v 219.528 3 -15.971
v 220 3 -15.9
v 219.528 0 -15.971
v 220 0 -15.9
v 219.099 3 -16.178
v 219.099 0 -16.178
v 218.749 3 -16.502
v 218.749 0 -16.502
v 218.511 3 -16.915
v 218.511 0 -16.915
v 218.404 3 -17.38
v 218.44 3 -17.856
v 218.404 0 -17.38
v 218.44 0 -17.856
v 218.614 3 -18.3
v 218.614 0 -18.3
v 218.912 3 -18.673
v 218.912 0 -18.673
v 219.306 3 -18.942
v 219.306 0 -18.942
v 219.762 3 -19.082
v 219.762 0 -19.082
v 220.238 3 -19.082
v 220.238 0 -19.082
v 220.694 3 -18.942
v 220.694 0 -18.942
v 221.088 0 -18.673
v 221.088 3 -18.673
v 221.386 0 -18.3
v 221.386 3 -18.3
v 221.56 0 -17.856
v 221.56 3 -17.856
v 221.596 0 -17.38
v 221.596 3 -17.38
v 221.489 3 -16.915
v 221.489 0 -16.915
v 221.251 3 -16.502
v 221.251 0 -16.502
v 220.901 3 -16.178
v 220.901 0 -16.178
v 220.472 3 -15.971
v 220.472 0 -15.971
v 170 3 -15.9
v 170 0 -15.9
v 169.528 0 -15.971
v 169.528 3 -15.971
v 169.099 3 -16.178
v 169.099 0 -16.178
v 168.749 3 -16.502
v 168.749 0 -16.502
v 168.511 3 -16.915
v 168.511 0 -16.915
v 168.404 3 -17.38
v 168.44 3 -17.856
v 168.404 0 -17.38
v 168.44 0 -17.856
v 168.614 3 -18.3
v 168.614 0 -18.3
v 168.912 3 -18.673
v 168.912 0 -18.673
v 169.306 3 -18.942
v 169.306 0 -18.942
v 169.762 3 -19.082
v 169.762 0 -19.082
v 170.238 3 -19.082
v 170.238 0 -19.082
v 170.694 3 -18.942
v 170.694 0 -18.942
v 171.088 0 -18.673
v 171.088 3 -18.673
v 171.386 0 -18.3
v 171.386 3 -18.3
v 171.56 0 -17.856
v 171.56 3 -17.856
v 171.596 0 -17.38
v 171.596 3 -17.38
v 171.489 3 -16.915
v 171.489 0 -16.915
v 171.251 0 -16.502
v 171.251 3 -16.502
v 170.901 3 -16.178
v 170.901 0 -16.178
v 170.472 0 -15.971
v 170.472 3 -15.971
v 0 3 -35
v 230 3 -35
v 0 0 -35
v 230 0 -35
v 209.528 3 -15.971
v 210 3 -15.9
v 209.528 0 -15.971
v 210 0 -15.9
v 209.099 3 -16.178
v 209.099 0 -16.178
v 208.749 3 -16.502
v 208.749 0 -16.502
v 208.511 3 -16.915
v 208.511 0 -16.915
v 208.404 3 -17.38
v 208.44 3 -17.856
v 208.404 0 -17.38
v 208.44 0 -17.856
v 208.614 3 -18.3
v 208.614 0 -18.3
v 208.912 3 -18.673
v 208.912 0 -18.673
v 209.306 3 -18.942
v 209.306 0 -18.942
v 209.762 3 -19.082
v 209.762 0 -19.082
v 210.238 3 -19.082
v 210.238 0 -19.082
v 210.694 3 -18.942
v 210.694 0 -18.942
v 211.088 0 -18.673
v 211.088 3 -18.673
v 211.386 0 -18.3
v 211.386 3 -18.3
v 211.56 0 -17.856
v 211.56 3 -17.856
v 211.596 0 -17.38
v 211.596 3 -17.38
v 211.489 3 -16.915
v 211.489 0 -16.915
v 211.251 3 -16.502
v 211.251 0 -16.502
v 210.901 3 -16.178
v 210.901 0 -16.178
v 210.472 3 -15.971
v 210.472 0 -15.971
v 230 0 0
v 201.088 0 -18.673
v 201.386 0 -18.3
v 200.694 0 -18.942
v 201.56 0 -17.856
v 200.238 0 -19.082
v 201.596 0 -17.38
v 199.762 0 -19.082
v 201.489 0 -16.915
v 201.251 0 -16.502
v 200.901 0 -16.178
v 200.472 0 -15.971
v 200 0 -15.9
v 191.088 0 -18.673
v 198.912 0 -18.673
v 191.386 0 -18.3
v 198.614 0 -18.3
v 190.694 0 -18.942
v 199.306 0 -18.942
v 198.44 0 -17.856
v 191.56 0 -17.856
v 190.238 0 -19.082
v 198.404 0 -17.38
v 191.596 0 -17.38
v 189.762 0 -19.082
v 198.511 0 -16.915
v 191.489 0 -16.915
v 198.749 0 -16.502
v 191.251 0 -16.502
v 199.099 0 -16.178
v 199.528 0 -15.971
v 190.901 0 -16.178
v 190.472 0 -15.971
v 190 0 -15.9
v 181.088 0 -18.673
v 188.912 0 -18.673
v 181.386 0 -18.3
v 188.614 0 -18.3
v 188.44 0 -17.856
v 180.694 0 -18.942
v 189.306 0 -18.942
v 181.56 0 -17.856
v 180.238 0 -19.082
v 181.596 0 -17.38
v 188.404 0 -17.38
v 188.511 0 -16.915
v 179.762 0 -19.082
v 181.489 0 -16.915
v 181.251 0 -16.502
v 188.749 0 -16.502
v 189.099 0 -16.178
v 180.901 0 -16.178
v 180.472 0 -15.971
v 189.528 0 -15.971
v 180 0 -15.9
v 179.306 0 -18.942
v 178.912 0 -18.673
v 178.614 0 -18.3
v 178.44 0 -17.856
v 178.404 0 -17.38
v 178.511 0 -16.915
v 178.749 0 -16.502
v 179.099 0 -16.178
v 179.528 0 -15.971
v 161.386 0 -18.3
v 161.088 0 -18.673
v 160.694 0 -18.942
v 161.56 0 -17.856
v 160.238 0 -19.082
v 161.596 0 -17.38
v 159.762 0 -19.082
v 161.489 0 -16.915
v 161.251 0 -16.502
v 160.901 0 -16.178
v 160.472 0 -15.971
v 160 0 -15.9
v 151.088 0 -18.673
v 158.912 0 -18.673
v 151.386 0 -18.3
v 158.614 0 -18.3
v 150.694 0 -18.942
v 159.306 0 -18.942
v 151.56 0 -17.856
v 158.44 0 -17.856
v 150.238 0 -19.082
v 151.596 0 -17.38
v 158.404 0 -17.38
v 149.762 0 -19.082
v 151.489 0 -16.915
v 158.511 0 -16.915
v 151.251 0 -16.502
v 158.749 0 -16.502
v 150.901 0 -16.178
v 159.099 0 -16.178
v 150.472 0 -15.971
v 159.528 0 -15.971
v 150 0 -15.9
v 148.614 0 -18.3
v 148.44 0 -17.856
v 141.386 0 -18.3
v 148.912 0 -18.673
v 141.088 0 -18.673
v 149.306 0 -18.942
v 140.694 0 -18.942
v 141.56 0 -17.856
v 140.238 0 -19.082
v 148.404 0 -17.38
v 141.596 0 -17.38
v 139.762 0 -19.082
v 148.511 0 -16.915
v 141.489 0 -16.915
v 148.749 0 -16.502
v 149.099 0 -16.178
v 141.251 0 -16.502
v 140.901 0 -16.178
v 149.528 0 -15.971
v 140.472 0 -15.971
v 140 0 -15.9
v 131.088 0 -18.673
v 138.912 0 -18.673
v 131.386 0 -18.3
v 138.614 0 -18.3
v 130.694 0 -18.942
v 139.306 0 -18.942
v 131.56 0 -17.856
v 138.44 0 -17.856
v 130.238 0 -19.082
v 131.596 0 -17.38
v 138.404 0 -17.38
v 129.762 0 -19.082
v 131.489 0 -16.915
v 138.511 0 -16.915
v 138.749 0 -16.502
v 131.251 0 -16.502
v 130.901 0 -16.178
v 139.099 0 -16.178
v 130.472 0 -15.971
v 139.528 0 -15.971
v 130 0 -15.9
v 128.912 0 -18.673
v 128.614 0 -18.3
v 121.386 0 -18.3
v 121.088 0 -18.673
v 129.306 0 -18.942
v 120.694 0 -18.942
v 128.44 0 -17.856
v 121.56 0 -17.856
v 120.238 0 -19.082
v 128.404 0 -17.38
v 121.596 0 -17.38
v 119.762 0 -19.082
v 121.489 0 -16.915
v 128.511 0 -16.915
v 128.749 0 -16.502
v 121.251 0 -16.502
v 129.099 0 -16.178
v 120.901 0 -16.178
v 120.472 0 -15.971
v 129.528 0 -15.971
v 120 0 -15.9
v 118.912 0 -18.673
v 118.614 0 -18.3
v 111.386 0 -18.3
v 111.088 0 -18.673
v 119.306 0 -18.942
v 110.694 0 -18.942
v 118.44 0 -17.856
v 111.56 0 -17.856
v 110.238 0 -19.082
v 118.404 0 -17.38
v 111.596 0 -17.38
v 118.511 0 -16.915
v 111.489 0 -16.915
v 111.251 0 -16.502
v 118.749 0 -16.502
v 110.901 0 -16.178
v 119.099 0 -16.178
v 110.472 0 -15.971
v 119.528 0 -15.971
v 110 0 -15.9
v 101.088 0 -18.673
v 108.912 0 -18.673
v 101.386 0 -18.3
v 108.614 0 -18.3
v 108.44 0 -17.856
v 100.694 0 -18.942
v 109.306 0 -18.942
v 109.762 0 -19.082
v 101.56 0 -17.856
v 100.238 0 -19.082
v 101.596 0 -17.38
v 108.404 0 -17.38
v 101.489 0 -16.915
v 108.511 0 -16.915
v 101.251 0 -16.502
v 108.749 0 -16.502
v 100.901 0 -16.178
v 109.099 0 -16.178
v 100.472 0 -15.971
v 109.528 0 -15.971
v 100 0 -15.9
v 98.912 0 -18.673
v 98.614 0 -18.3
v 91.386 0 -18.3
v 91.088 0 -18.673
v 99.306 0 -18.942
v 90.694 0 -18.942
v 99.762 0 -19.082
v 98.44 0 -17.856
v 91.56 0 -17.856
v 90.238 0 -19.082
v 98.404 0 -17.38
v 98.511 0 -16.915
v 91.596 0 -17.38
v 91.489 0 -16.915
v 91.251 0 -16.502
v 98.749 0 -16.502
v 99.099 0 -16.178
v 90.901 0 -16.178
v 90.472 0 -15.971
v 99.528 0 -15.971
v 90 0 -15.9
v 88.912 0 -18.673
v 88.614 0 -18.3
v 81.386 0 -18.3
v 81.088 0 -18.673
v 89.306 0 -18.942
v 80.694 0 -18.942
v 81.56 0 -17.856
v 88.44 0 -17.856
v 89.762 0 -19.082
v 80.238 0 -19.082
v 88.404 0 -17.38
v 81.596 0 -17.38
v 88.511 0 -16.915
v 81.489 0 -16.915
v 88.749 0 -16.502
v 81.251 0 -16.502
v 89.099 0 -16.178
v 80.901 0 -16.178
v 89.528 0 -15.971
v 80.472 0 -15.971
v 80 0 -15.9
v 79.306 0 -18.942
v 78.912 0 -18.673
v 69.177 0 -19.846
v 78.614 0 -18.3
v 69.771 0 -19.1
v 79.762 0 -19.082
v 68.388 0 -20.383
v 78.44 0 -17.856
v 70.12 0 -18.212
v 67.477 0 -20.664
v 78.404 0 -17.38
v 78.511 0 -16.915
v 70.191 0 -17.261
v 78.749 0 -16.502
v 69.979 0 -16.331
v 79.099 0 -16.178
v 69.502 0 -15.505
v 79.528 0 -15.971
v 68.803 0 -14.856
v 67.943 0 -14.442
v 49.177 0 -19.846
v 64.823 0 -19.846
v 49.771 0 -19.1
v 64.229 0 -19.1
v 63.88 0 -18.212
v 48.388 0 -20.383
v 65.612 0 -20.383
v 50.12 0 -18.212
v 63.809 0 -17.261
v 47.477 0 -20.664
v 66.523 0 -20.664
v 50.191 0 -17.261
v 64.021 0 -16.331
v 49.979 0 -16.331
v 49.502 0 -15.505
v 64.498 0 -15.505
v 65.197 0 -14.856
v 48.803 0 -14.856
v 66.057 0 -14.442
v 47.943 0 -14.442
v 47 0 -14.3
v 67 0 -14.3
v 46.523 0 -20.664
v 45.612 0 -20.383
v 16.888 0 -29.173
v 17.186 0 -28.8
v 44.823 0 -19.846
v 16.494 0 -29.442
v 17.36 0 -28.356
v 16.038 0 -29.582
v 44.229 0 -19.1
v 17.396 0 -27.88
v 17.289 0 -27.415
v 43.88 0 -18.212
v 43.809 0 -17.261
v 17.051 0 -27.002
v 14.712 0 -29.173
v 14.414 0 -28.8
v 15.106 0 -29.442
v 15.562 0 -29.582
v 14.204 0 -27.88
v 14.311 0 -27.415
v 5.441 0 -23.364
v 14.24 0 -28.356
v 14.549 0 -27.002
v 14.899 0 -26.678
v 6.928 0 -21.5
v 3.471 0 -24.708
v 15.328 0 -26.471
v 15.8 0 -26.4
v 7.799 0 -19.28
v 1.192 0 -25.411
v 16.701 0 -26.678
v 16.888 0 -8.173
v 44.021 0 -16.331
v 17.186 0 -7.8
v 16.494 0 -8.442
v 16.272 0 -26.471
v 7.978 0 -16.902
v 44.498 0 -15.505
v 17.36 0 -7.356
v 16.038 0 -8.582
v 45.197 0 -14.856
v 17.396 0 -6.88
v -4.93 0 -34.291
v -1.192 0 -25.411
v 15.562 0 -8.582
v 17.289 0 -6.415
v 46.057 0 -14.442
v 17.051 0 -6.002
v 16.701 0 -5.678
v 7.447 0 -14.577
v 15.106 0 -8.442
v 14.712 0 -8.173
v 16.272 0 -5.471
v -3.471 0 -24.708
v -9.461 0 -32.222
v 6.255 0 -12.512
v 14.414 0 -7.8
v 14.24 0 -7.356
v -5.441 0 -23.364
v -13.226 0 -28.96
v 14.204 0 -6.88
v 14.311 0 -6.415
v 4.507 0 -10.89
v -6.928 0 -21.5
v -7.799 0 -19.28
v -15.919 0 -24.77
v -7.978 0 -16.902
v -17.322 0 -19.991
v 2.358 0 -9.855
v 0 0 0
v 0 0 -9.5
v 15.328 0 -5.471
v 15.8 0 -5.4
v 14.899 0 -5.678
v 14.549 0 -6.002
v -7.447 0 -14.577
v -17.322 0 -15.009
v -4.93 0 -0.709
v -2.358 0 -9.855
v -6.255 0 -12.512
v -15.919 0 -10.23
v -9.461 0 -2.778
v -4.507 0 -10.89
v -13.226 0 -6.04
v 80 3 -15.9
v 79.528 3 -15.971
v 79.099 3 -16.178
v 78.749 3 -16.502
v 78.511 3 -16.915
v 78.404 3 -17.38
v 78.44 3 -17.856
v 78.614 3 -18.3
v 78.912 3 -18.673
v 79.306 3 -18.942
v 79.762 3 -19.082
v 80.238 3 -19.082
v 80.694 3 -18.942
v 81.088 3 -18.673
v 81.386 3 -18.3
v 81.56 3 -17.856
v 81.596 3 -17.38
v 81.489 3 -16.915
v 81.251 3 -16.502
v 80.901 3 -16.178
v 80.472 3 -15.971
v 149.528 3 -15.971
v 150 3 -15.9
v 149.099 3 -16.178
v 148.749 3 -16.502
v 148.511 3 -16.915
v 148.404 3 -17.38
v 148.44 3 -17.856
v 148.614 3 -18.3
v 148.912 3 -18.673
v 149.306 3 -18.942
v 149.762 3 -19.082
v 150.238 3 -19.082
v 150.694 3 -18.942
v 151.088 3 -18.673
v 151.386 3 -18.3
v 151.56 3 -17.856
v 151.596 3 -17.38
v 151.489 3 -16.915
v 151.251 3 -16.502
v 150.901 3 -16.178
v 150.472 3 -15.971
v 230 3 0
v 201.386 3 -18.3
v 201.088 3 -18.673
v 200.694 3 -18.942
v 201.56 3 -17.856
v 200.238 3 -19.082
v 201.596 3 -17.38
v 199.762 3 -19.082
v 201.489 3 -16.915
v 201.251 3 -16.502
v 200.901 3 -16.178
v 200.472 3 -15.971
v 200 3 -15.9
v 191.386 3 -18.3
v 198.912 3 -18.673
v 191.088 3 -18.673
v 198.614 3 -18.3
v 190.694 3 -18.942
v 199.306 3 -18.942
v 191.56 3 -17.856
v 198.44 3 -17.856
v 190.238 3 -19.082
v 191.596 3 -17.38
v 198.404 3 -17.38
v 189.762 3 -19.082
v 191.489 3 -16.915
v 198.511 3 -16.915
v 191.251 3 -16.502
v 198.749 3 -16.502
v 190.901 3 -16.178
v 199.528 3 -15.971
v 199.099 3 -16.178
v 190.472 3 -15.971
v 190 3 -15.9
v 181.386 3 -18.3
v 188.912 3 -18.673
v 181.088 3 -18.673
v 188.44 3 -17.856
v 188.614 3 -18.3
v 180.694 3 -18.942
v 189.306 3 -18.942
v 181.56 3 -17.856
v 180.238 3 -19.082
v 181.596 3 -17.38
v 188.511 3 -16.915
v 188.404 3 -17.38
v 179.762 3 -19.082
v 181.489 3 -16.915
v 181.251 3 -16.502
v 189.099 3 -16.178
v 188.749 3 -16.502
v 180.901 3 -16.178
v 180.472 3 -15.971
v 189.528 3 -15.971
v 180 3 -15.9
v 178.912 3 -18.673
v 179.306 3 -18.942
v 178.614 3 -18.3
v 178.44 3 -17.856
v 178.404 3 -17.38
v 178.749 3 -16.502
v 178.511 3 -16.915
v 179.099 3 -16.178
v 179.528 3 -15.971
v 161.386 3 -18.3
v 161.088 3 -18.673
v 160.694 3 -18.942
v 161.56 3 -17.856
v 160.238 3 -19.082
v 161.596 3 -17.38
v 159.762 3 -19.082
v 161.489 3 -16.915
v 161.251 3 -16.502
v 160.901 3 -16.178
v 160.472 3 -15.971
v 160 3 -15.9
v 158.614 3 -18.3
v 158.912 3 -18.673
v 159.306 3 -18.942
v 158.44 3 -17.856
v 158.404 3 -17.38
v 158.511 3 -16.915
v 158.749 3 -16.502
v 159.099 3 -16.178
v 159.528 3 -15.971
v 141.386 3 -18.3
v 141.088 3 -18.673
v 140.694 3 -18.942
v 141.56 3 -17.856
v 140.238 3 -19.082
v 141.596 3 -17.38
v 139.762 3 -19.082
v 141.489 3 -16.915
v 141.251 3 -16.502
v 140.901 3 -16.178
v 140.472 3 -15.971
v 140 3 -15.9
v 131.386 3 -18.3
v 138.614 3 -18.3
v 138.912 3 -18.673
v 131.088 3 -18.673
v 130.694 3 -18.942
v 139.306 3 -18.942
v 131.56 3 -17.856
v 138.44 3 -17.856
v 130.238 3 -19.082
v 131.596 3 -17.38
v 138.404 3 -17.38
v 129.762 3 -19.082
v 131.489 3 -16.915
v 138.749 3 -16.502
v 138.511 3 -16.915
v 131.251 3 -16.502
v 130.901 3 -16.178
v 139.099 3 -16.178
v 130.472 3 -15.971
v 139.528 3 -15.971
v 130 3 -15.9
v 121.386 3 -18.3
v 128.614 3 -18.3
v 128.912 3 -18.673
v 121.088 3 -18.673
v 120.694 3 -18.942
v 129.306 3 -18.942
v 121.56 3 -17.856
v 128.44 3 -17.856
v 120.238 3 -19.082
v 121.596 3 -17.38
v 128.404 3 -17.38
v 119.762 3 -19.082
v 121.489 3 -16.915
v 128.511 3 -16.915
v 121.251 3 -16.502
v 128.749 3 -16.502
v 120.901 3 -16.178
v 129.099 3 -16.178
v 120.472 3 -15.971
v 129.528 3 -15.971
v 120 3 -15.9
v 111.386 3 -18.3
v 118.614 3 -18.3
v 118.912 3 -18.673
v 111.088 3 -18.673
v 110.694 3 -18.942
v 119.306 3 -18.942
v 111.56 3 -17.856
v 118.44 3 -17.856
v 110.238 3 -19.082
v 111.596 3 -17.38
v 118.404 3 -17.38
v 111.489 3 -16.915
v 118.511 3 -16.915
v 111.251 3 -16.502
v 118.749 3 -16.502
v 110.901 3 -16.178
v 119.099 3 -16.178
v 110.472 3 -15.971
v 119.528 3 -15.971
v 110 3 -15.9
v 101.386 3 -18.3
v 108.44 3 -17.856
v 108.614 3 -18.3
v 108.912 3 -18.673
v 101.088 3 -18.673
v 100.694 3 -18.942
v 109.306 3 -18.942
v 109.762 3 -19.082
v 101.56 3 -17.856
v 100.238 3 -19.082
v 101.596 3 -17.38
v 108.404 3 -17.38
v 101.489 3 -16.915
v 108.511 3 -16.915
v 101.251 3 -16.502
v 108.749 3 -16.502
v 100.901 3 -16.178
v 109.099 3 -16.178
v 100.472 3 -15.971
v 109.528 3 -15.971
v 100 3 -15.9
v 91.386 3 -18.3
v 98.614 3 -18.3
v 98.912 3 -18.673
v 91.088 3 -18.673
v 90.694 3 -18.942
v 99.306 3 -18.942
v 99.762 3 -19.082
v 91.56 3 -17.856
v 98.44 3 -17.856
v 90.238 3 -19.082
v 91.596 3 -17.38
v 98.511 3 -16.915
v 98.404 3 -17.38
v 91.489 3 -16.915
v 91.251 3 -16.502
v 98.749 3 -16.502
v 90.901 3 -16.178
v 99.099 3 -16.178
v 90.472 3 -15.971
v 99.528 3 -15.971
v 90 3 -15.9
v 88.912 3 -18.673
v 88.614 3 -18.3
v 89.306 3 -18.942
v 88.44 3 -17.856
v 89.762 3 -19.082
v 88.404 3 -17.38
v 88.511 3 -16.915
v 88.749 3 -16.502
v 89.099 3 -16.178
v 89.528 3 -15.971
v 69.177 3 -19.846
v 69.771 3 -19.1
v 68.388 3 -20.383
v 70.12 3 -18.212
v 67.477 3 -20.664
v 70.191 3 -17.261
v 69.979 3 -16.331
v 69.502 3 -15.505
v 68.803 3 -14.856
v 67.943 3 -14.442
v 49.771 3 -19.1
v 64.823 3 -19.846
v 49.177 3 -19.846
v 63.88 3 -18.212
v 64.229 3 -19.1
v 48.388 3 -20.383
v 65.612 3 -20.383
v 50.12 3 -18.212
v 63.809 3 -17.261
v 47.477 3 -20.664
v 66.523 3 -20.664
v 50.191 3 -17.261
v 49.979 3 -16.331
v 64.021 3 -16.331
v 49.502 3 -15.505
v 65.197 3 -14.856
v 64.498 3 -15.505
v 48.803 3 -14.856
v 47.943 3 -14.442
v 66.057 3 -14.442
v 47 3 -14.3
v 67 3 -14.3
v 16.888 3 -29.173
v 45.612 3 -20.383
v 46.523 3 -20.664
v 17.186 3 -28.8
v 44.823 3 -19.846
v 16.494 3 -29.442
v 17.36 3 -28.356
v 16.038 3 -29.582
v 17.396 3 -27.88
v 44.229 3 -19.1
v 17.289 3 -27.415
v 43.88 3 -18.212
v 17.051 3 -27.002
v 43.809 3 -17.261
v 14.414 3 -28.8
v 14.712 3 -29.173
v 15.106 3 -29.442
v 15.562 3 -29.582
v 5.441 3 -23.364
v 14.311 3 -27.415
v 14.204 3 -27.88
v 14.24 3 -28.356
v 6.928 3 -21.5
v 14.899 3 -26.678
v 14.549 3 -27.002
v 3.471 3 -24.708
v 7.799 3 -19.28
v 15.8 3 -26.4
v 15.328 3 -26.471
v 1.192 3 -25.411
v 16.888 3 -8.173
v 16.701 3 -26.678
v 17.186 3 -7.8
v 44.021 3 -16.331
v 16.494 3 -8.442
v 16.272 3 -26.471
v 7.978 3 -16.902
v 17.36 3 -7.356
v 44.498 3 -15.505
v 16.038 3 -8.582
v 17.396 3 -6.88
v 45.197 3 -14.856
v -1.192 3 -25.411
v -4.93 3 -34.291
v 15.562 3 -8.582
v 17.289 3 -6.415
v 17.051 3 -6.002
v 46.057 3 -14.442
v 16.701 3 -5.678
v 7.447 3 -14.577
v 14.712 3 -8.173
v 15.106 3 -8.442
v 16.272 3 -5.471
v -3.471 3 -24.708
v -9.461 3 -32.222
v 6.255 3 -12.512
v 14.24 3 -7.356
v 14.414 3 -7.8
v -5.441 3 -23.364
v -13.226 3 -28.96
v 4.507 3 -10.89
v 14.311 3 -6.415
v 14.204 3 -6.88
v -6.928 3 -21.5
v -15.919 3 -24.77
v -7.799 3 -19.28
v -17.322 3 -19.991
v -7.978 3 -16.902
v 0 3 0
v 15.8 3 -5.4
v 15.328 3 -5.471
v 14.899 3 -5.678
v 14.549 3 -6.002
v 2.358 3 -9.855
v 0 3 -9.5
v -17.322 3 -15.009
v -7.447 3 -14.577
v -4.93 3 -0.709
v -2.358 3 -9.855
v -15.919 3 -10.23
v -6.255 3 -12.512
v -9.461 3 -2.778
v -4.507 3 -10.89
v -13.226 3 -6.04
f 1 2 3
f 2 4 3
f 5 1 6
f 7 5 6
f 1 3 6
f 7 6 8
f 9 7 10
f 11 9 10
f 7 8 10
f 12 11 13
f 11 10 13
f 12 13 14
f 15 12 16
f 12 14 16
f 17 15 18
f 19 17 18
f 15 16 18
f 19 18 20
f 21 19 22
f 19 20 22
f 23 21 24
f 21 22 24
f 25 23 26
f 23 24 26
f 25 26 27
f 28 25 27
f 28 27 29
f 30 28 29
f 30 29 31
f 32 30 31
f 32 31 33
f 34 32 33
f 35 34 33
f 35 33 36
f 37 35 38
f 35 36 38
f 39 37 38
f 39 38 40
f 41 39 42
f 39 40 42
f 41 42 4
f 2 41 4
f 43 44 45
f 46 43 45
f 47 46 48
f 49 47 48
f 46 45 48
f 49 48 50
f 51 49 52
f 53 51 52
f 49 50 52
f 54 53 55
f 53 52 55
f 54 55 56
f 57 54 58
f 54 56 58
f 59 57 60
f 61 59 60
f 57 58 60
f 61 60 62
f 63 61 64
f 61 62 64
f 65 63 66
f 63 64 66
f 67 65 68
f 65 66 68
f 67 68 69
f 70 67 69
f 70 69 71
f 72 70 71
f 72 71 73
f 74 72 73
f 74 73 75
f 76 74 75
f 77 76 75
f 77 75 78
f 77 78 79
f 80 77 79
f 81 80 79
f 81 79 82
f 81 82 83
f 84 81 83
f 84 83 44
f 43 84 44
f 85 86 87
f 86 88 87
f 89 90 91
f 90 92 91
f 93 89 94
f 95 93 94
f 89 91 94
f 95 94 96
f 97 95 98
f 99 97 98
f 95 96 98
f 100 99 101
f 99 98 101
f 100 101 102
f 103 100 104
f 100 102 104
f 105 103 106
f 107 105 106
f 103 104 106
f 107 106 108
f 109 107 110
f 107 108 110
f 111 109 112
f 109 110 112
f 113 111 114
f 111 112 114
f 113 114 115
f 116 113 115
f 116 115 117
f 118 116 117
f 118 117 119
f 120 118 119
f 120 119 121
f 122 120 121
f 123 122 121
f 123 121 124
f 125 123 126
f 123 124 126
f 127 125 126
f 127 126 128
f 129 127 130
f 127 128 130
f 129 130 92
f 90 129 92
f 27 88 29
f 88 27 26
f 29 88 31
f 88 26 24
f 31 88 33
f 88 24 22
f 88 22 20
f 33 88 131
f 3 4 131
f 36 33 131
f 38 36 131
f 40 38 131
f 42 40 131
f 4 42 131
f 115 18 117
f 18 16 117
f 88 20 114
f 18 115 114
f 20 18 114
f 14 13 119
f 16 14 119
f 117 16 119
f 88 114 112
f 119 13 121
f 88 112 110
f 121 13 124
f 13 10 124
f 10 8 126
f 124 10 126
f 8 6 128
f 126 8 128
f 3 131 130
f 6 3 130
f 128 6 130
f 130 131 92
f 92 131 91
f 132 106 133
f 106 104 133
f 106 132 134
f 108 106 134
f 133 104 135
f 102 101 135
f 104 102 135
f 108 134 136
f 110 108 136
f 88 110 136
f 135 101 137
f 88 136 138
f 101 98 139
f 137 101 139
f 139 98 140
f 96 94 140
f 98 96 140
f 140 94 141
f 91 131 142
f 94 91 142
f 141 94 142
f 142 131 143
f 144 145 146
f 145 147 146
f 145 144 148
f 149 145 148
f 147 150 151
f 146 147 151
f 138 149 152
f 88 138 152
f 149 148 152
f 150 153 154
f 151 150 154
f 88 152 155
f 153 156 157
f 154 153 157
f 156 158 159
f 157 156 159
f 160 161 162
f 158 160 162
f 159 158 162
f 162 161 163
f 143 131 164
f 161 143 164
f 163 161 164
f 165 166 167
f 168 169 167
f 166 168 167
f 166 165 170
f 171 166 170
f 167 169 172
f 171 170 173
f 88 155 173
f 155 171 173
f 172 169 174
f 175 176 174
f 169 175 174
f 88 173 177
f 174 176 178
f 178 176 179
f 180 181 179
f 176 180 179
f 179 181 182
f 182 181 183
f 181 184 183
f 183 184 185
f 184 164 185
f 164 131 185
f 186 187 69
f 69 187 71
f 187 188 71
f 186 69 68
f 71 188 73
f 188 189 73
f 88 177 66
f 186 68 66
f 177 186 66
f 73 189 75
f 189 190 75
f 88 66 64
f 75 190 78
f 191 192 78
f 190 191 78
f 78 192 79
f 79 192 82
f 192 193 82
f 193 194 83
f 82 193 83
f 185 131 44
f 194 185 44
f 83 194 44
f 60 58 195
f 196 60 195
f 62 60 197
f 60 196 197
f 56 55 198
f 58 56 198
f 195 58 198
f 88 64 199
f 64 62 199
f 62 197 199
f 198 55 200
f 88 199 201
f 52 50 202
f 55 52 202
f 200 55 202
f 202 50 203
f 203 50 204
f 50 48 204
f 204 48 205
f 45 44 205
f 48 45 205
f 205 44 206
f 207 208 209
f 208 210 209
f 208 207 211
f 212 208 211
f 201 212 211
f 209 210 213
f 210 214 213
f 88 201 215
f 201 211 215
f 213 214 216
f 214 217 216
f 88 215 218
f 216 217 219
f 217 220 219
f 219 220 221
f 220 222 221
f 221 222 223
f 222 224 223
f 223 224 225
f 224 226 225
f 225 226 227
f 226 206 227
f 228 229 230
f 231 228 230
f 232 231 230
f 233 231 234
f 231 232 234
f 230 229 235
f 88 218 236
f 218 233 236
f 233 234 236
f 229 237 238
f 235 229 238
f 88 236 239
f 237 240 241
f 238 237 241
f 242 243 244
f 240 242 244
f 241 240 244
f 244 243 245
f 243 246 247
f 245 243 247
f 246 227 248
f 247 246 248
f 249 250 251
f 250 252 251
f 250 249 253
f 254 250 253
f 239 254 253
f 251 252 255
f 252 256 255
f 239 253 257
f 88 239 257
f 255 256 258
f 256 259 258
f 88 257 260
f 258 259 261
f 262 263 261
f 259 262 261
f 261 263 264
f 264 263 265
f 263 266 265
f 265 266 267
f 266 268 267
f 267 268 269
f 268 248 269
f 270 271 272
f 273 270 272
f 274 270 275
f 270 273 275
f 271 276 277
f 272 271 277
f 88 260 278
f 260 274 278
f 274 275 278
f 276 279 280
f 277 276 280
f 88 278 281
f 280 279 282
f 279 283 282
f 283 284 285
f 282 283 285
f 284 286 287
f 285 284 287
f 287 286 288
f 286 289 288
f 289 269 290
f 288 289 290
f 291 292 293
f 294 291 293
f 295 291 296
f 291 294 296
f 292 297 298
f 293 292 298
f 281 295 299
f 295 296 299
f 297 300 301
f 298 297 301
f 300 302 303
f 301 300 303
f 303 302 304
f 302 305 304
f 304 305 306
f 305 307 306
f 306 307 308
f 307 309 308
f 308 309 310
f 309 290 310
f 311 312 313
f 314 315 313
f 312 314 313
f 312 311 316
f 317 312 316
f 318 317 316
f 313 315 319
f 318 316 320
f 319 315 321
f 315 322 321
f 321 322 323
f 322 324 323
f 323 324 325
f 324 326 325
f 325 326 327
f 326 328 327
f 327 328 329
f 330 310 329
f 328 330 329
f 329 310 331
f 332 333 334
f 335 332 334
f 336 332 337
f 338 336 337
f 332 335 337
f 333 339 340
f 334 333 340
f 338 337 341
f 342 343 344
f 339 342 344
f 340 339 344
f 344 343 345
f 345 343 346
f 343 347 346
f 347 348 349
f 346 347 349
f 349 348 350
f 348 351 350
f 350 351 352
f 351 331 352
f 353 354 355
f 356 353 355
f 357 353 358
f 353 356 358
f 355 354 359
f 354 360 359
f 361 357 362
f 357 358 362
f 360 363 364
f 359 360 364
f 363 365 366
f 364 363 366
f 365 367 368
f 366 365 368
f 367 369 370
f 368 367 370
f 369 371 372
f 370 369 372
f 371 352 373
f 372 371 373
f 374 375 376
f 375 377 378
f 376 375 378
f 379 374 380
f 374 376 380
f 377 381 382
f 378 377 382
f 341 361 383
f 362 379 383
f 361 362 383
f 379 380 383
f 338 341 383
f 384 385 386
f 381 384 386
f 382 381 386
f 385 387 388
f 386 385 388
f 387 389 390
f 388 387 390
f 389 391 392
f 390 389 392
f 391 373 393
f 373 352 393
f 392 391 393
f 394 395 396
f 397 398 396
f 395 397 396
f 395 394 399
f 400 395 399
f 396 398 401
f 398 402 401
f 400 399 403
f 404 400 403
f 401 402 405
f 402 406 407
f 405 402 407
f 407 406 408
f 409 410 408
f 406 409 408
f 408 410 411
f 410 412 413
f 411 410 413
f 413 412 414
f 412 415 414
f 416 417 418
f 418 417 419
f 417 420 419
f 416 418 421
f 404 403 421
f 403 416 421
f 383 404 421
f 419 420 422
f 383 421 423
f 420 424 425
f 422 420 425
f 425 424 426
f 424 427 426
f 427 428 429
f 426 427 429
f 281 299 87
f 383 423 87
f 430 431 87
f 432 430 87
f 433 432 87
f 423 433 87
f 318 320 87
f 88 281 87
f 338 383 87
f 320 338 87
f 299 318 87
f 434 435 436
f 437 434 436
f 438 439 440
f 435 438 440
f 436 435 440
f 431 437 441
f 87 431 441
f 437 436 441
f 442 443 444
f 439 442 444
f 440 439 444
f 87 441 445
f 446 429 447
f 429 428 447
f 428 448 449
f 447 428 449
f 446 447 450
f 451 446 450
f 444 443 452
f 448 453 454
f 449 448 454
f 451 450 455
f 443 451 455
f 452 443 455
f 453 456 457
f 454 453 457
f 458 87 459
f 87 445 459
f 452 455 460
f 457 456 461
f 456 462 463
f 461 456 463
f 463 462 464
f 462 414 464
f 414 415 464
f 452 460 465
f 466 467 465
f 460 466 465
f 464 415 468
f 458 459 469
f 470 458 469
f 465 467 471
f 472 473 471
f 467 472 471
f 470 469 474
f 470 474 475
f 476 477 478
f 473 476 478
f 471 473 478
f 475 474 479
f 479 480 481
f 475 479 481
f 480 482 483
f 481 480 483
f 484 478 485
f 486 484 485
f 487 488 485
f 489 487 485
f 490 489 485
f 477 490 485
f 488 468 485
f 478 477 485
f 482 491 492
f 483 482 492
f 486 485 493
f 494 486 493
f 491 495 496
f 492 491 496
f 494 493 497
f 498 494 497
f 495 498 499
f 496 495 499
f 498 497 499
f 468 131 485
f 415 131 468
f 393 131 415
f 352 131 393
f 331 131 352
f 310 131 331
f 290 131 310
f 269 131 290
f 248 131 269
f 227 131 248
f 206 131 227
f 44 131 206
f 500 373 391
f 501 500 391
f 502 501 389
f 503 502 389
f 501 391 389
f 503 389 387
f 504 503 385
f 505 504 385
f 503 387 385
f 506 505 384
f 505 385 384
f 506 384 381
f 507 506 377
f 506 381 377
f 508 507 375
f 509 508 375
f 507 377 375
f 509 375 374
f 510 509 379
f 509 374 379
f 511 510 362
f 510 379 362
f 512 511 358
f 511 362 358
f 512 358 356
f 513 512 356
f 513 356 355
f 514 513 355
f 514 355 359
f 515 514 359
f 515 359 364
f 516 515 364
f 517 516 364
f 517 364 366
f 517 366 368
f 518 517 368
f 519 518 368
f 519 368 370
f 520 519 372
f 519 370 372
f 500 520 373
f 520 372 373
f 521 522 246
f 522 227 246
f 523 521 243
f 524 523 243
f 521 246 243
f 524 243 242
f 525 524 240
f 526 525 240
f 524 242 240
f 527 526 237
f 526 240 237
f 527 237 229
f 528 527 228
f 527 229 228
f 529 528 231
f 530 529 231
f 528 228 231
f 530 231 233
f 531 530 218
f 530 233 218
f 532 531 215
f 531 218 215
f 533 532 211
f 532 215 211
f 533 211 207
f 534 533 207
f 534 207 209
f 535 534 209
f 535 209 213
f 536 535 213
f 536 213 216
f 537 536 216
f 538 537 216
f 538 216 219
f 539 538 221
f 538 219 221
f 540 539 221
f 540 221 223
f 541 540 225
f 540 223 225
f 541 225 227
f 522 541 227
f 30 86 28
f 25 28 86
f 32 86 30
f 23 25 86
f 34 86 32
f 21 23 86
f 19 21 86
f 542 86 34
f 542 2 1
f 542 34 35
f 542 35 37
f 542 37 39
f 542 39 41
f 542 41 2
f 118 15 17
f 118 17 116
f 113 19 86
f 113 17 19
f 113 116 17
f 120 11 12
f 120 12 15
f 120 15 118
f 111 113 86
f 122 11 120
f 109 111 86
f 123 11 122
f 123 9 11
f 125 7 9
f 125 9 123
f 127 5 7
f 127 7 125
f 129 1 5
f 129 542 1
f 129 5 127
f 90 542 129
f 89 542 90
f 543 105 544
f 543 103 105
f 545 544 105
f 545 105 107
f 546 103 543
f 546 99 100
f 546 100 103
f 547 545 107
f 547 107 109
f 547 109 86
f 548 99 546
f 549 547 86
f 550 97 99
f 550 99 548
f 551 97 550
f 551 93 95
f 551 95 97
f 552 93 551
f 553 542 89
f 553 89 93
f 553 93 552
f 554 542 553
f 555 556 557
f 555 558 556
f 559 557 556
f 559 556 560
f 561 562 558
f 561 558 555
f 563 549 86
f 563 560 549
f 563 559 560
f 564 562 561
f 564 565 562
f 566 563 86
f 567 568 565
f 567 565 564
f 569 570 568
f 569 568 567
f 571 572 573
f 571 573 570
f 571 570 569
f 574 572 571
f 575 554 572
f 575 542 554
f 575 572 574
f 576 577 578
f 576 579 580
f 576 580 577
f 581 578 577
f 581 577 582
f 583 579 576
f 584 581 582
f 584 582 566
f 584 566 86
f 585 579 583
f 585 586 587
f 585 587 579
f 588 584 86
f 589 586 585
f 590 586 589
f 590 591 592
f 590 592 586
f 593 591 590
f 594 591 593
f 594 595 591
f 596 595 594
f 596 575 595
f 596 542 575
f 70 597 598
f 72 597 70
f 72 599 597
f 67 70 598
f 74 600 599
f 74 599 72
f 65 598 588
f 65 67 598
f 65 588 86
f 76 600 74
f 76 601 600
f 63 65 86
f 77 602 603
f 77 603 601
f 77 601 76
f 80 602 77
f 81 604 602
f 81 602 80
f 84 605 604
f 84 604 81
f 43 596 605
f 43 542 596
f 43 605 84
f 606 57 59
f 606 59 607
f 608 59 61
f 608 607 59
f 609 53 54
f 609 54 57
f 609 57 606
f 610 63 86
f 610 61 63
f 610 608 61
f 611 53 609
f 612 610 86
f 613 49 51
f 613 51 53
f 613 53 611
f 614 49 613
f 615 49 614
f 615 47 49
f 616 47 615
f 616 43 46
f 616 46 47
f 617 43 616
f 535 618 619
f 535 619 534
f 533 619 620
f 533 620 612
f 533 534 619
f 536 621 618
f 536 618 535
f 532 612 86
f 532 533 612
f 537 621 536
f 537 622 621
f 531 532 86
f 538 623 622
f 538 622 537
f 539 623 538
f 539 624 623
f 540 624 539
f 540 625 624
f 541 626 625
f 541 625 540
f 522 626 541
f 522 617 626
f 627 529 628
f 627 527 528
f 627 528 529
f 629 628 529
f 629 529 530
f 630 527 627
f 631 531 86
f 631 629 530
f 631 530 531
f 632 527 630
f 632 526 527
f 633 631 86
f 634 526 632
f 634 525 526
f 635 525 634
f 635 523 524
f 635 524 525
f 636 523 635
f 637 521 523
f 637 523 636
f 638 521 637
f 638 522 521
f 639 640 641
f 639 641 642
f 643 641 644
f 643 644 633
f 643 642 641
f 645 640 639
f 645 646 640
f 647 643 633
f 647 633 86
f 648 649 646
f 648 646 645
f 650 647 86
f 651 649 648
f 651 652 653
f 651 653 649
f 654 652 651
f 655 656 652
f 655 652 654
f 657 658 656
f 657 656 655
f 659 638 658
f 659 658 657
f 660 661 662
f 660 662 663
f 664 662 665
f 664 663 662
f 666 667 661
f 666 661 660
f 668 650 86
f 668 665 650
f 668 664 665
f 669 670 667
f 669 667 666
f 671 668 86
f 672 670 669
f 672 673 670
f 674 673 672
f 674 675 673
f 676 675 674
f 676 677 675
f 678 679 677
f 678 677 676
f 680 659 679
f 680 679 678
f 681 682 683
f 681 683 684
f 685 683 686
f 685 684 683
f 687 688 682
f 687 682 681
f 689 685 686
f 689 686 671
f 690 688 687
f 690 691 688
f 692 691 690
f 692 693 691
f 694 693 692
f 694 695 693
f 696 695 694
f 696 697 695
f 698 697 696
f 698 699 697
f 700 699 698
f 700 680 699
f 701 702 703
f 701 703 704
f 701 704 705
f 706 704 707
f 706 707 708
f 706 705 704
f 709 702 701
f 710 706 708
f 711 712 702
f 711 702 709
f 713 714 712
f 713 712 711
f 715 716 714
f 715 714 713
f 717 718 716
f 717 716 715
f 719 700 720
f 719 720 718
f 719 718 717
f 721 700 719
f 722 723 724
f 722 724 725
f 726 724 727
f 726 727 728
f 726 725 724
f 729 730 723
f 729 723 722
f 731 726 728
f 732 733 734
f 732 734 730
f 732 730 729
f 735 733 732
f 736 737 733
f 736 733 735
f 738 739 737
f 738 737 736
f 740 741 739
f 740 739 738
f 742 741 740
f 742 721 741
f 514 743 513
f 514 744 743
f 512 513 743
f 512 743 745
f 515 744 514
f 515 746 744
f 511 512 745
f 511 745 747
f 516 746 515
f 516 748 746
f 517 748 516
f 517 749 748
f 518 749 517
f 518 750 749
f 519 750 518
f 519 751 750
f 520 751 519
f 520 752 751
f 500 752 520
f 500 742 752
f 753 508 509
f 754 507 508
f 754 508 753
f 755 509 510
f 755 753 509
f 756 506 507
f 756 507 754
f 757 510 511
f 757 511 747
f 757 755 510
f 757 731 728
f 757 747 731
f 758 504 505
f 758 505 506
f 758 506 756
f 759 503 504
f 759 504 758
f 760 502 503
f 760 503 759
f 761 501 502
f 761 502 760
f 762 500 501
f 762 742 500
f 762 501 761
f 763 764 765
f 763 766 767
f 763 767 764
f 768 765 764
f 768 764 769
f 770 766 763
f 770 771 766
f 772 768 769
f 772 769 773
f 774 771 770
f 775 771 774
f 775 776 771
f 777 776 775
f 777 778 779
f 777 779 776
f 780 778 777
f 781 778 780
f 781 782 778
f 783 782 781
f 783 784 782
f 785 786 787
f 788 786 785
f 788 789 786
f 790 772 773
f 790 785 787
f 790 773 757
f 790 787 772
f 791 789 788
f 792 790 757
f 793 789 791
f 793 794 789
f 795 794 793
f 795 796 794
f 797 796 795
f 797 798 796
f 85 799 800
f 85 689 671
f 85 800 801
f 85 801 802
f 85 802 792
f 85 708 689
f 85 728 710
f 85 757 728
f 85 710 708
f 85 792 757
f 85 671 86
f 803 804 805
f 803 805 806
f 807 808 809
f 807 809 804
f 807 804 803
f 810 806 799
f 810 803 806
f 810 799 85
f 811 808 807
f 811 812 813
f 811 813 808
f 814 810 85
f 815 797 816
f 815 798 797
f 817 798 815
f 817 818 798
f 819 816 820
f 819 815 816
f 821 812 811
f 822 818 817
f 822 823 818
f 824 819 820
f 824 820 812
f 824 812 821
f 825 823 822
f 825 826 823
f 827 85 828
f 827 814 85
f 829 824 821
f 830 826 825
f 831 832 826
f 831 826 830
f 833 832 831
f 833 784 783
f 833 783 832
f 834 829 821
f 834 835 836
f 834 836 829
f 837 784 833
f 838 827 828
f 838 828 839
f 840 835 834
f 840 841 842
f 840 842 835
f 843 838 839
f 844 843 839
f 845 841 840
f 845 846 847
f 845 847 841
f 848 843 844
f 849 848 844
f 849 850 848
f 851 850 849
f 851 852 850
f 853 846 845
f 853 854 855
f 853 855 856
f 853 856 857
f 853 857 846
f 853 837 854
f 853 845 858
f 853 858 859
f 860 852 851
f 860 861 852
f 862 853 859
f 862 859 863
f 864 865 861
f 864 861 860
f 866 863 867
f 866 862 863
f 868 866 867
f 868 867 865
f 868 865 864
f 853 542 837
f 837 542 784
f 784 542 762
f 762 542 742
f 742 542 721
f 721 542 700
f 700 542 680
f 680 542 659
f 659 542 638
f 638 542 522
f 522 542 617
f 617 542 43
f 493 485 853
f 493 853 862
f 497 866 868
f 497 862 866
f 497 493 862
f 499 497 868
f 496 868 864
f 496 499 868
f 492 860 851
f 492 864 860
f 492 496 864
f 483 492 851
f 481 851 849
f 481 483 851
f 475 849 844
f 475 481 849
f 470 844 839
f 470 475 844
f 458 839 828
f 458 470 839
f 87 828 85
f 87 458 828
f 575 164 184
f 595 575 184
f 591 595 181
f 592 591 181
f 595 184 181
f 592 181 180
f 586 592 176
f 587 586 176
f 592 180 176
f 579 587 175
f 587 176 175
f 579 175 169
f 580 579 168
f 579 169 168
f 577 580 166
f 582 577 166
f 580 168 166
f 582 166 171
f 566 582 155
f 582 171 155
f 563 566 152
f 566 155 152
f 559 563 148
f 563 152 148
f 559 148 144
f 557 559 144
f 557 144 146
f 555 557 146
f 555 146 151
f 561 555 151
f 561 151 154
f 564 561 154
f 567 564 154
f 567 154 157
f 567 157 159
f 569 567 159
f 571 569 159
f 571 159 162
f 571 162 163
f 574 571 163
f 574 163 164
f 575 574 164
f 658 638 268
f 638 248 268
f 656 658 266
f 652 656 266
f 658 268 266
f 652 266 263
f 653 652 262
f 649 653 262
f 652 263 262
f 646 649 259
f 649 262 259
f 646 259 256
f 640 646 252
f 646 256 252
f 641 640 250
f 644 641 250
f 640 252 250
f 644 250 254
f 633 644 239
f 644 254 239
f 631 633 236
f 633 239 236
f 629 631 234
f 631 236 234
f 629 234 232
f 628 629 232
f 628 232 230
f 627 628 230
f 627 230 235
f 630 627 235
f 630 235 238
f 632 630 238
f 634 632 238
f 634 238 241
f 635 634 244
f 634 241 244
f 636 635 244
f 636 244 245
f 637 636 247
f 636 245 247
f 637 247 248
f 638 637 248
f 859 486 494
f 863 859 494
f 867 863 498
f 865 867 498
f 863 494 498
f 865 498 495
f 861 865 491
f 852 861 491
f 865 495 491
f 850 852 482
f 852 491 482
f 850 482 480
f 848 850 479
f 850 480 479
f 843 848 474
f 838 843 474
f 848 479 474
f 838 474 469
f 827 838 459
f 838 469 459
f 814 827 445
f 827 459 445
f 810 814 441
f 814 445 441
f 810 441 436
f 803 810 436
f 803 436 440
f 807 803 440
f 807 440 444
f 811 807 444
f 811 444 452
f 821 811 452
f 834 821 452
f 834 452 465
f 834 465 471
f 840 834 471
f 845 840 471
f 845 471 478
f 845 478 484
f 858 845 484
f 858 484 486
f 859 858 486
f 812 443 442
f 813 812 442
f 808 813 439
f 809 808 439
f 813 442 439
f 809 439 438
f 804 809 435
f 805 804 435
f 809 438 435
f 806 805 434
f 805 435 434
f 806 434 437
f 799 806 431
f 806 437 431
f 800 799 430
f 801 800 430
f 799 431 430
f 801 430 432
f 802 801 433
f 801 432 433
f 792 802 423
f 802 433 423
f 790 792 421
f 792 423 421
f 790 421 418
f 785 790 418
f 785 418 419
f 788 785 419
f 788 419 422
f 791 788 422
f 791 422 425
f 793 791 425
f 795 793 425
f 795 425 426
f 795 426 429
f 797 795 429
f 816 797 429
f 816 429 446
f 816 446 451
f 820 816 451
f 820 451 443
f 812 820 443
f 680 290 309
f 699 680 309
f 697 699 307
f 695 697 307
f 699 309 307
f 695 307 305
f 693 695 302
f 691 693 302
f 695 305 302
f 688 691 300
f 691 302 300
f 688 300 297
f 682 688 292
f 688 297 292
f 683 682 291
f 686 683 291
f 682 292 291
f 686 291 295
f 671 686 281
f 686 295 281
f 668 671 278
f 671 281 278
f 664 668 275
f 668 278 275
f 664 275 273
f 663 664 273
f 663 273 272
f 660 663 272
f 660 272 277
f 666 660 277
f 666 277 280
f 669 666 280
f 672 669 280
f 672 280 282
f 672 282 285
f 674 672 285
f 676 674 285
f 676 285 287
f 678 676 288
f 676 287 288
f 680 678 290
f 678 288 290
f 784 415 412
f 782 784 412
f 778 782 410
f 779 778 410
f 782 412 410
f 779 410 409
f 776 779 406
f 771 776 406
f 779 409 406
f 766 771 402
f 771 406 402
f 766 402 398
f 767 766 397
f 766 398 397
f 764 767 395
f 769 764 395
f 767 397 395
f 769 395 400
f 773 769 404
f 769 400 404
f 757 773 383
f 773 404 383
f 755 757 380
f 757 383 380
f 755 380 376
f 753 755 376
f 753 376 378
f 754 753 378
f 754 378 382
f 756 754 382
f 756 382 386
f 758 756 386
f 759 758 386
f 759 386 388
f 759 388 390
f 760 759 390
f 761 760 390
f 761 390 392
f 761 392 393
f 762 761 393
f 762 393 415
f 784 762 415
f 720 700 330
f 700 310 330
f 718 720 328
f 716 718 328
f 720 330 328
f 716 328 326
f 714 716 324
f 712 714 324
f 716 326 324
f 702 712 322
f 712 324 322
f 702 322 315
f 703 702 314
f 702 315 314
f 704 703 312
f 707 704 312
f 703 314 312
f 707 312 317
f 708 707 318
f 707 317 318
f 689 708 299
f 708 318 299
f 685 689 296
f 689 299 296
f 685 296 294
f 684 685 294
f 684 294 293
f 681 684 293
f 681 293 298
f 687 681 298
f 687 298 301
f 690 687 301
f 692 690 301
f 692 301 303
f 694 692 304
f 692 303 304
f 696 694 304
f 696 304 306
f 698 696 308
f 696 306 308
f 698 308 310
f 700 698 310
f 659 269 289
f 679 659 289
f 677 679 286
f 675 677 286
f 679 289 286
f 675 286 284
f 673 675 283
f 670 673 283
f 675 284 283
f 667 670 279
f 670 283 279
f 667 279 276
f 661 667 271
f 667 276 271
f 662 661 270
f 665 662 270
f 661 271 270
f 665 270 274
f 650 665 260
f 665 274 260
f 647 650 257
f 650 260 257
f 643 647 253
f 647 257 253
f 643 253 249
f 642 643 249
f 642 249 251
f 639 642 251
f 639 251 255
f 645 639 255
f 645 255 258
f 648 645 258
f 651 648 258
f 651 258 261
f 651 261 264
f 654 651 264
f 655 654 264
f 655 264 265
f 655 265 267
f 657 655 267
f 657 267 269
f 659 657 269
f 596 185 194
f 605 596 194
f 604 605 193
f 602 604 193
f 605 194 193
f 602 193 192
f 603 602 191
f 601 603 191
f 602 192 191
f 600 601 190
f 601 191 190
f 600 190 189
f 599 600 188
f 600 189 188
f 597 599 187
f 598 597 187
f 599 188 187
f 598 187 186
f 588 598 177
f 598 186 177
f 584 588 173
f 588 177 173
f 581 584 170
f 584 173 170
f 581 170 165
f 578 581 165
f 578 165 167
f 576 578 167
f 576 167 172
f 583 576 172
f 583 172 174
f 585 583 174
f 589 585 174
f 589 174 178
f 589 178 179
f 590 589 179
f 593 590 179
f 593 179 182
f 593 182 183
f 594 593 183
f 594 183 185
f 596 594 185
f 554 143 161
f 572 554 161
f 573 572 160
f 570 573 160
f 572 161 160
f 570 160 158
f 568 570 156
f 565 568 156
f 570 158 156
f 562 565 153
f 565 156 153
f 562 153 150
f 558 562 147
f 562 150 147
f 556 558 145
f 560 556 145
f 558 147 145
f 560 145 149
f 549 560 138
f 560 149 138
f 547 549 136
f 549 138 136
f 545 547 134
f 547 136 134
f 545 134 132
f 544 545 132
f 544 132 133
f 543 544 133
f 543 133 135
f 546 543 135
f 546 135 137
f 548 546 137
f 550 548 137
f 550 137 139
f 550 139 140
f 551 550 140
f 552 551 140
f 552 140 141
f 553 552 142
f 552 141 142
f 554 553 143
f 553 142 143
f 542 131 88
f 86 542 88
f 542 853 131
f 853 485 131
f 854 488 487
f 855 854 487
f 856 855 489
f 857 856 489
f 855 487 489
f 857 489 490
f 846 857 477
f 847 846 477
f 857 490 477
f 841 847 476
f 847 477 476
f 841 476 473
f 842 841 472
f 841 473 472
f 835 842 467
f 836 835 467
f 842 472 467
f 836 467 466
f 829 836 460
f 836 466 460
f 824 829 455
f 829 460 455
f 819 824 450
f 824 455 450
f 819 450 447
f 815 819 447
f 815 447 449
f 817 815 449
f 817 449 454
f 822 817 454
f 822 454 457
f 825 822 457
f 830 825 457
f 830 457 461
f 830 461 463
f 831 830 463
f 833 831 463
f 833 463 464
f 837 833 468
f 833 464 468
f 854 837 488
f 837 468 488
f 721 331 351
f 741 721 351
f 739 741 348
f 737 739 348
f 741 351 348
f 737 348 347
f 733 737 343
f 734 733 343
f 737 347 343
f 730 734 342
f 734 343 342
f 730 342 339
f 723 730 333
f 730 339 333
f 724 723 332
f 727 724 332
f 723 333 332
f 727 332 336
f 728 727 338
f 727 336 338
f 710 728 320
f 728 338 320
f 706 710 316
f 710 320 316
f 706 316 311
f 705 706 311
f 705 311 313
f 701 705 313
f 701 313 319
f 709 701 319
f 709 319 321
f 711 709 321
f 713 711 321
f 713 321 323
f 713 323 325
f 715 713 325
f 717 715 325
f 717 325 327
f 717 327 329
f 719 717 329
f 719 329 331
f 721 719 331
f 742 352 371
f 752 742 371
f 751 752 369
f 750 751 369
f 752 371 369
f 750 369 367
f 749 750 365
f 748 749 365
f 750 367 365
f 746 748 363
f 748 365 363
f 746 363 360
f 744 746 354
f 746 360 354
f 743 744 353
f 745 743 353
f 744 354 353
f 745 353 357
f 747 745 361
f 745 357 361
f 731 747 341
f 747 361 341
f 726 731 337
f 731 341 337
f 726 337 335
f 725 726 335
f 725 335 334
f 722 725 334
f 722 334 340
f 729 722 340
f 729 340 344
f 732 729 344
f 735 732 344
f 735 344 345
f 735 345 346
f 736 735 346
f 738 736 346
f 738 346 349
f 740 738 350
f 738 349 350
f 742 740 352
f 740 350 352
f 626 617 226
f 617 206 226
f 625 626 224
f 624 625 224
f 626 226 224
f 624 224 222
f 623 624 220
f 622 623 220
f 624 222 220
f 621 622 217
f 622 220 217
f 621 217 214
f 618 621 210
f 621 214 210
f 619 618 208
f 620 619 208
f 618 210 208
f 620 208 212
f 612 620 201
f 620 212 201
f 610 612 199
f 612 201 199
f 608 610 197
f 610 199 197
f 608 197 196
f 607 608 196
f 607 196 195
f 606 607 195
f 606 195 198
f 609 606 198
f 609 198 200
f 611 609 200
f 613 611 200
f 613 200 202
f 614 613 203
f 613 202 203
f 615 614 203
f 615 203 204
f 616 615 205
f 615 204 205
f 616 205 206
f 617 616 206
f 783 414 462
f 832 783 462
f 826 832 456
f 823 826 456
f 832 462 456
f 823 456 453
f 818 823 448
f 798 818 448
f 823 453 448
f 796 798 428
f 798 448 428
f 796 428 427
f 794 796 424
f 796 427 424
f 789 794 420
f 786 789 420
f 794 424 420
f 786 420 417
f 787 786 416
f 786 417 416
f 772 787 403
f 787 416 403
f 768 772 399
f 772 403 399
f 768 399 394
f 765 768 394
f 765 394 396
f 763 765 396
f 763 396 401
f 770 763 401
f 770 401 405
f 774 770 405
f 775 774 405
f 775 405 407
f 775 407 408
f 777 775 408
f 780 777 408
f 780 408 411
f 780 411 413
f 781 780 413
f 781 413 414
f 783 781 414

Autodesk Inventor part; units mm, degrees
ref_plane "YZ Plane" through (0, 0, 0) normal (1, 0, 0) x (0, 1, 0)
ref_plane "XZ Plane" through (0, 0, 0) normal (0, 1, 0) x (-1, 0, 0)
ref_plane "XY Plane" through (0, 0, 0) normal (0, 0, 1) x (1, 0, 0)
sketch "スケッチ1" plane through (0, 0, 0) normal (0, 1, 0) x (-1, 0, 0)
  line L0 (0, 0) -> (-230, 0)
  line L1 (-230, 0) -> (-230, -35)
  line L2 (-230, -35) -> (0, -35)
  line L3 (0, -35) -> (0, 0)
  arc A0 (0, -35) -> (0, 0) centre (0, -17.5) ccw
  dimension "d0" = 230
  dimension "d1" = 35
  dimension "d2" = 17.5
extrude "押し出し1" add sketch "スケッチ1" along normal blind 3
sketch "スケッチ2" plane through (0, 3, 0) normal (0, 1, 0) x (1, 0, 0)
  line L0 (0, 17.5) -> (238.6526, 17.5)
  line L1 (0, 0) -> (230, 0) projected
  arc A0 (0, 35) -> (0, 0) centre (0, 17.5) ccw projected
  point P0 (90, 17.5)
  point P1 (100, 17.5)
  point P2 (110, 17.5)
  point P3 (120, 17.5)
  point P4 (130, 17.5)
  point P5 (140, 17.5)
  point P6 (150, 17.5)
  point P7 (160, 17.5)
  point P8 (170, 17.5)
  point P9 (180, 17.5)
  point P10 (190, 17.5)
  point P11 (200, 17.5)
  point P12 (210, 17.5)
  point P13 (-17.5, 17.5)
  point P14 (220, 17.5)
  point P15 (80, 17.5)
  dimension "d5" = 17.5
  dimension "d13" = 10
  dimension "d14" = 10
  dimension "d15" = 10
  dimension "d16" = 10
  dimension "d17" = 10
  dimension "d18" = 10
  dimension "d19" = 10
  dimension "d20" = 10
  dimension "d21" = 10
  dimension "d22" = 10
  dimension "d23" = 10
  dimension "d24" = 10
  dimension "d35" = 17.5
  dimension "d67" = 10
  dimension "d78" = 10
  dimension "d96" = 80
hole "穴1" at (90, 3, -17.5) at (100, 3, -17.5) at (110, 3, -17.5) at (120, 3, -17.5) at (130, 3, -17.5) at (140, 3, -17.5) at (150, 3, -17.5) at (160, 3, -17.5) at (170, 3, -17.5) at (180, 3, -17.5) at (190, 3, -17.5) at (200, 3, -17.5) at (210, 3, -17.5) at (220, 3, -17.5) at (80, 3, -17.5) direction (0, -1, 0) diameter 3.2 end through all
sketch "スケッチ3" plane through (0, 3, 0) normal (0, 1, 0) x (1, 0, 0)
  line L0 (230, 35) -> (0, 35) projected
  point P0 (0, 0)
  point P1 (0, 17.5)
  dimension "d36" = 17.5
hole "穴2" at (0, 3, -17.5) direction (0, -1, 0) diameter 16 end through all
sketch "スケッチ4" plane through (0, 3, 0) normal (0, 1, 0) x (1, 0, 0)
  circle A0 centre (0, 17.5) radius 6
  circle A1 centre (0, 17.5) radius 8 projected
  line L0 (-0.1439, 17.5) -> (-6.5454, 17.5)
  line L1 (-6.5454, 17.5) -> (7.5104, 17.5)
  point P0 (0, 0)
  point P1 (0, 11.5)
  point P2 (6, 17.5)
  point P3 (0, 23.5)
  point P4 (-6, 17.5)
  dimension "d44" = 12
  dimension "d45" = 0
hole "穴3" [suppressed]
sketch "スケッチ5" plane through (0, 3, 0) normal (0, 1, 0) x (1, 0, 0)
  circle A0 centre (0, 17.5) radius 8 projected
  point P0 (0, 0)
  point P1 (15.8, 7)
  point P2 (15.8, 28)
  point P3 (24.9999, 17.5)
  dimension "d53" = 10.5
  dimension "d55" = 15.8
  dimension "d56" = 15.8
  dimension "d83" = 10.5
hole "穴4" at (15.8, 3, -28) at (15.8, 3, -7) direction (0, -1, 0) diameter 3.2 end through all
sketch "スケッチ6" plane through (0, 3, 0) normal (0, 1, 0) x (1, 0, 0)
  circle A0 centre (0, 17.5) radius 8 construction
  line L0 (0, 17.5) -> (230, 17.5) construction
  line L1 (230, 0) -> (230, 35) construction
  point P0 (0, 0)
  point P1 (67, 17.5)
  point P2 (47, 17.5)
  dimension "d69" = 47
  dimension "d70" = 20
hole "穴5" at (67, 3, -17.5) at (47, 3, -17.5) direction (0, -1, 0) diameter 6.4 end through all
sketch "スケッチ7" plane through (0, 3, 0) normal (0, 1, 0) x (1, 0, 0)
  circle A0 centre (0, 17.5) radius 8 construction
  circle A1 centre (0, 17.5) radius 12.5 construction
  point P0 (0, 0)
  point P1 (0, 5)
  point P2 (12.5, 17.5)
  point P3 (0, 30)
  point P4 (-12.5, 17.5)
  dimension "d84" = 25
  dimension "d87" = 360
hole "穴6" [suppressed]
properties part number "shoulder2_lower_left_plate" material "アルミニウム 5052"
